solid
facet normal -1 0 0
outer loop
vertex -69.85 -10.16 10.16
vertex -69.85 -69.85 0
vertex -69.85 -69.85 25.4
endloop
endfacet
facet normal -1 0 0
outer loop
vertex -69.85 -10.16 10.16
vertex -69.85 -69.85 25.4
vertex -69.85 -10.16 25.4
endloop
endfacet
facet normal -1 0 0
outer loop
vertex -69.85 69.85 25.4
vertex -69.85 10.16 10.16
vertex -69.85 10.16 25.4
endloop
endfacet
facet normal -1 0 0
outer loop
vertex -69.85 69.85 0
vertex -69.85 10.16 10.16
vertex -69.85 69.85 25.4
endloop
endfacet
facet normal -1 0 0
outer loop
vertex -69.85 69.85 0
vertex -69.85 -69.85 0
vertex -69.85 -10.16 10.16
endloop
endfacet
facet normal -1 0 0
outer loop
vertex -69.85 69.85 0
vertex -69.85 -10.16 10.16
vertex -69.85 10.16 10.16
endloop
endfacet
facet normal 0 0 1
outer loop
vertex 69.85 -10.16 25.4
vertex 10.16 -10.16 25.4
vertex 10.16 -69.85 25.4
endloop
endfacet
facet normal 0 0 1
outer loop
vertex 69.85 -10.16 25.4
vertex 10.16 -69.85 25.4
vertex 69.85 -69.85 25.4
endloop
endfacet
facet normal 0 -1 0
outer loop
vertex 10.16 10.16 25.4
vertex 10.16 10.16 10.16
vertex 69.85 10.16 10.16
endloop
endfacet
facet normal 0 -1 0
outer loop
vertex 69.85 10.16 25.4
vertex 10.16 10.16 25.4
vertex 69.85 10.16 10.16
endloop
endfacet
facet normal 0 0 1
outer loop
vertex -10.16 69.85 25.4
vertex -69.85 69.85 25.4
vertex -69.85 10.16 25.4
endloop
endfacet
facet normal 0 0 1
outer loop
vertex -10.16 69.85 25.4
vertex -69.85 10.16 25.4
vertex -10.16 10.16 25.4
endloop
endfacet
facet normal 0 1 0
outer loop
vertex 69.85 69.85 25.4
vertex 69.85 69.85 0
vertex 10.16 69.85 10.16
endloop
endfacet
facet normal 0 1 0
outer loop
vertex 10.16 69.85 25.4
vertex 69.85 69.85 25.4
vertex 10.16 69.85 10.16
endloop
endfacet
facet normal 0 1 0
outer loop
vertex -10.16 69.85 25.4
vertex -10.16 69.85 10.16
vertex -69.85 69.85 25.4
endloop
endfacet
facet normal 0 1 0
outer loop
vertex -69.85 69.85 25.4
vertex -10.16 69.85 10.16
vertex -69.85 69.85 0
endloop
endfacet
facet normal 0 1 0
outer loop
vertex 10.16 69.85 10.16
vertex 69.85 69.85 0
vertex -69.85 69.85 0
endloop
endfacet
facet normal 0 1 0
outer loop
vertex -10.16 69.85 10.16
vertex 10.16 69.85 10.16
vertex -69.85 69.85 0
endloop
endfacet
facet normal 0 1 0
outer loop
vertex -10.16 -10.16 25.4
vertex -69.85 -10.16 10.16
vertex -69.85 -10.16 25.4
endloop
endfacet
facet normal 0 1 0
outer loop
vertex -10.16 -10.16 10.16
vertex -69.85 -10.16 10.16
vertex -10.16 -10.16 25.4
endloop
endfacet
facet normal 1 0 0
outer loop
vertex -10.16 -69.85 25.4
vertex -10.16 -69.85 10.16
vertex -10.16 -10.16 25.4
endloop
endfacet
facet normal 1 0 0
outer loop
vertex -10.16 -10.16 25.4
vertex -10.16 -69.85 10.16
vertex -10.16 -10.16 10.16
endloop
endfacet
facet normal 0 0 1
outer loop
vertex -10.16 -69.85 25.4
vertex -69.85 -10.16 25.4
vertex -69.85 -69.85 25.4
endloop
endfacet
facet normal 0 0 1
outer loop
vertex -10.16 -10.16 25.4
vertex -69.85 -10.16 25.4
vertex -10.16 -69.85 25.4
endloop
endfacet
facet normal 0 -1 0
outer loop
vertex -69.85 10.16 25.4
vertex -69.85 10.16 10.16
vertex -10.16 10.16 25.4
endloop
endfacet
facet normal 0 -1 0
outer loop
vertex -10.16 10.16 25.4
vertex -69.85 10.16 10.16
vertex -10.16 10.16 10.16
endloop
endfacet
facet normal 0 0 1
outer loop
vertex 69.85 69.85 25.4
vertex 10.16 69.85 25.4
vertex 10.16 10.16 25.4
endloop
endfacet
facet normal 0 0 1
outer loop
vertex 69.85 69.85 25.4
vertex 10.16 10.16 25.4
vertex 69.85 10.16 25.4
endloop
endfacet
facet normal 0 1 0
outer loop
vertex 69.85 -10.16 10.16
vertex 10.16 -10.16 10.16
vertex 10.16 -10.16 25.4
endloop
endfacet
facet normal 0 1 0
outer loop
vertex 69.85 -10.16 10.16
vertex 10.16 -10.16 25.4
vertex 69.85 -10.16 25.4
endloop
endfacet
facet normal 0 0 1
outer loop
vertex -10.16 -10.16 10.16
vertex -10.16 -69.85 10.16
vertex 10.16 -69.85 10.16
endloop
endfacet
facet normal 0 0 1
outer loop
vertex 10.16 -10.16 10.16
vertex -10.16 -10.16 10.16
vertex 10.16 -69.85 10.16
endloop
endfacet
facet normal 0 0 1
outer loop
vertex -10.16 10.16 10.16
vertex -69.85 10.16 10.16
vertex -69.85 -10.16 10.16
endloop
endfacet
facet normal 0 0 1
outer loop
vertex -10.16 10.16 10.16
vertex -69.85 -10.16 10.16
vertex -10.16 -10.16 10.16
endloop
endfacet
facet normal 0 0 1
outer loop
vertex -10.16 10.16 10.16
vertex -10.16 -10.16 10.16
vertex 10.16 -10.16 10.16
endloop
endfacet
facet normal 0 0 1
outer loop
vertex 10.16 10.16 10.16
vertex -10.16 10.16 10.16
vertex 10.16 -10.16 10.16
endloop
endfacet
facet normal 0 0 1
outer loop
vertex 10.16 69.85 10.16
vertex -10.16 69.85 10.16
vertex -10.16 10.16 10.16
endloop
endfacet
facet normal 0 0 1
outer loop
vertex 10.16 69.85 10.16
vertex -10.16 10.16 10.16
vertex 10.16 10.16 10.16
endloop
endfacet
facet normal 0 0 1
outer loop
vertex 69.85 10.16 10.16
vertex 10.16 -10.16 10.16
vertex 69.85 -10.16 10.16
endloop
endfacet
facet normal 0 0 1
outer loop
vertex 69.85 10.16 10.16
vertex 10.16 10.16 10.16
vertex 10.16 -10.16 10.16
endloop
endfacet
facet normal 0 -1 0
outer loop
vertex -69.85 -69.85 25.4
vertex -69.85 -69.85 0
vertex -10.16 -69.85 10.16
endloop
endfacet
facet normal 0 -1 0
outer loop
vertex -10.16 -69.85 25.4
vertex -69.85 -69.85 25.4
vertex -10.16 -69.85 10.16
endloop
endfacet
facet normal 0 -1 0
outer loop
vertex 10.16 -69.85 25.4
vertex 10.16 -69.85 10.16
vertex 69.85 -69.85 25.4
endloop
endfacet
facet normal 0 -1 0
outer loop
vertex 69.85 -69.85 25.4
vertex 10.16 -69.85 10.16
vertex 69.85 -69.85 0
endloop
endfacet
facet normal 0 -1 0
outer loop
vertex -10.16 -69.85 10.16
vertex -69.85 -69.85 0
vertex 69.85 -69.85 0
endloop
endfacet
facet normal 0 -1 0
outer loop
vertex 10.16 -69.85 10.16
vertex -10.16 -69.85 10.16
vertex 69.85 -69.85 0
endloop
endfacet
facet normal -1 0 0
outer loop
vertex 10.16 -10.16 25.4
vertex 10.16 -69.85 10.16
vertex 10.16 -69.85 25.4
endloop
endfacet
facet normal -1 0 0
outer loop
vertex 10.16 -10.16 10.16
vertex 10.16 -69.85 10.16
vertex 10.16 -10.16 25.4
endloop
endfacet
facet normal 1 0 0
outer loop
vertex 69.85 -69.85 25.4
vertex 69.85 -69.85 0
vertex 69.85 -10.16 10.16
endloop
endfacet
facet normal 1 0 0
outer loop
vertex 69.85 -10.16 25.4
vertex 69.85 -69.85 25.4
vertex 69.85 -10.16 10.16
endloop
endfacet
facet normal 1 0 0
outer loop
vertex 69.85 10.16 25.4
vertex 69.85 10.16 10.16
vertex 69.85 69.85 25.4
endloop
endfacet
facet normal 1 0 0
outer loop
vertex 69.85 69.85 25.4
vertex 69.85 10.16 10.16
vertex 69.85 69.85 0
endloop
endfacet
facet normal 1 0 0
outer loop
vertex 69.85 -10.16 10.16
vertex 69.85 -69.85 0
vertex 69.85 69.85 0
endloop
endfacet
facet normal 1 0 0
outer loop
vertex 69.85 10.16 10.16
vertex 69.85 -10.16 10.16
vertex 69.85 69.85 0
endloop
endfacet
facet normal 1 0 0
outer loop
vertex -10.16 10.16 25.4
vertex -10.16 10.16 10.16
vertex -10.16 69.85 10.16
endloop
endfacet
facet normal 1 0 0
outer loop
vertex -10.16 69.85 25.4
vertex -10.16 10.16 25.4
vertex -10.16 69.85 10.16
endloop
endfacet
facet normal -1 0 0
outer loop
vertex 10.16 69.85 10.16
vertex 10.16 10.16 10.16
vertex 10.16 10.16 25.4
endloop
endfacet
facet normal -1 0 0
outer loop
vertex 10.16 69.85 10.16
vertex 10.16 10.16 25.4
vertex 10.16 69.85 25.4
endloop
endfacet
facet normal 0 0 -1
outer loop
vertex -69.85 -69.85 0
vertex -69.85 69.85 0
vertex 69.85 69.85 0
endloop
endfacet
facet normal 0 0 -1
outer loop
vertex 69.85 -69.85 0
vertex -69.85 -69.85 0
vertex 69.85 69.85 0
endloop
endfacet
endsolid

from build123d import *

# Parameters (mm, degrees)
F0_W     = 59.69
F0_H     = 59.69
F1_DEPTH = 25.4
F3_DEPTH = 10.16


with BuildPart() as f1:
    # F0 (on Top) → F1 (new body)
    with BuildSketch(Plane.XY):
        with Locations((40.005, 40.005)):
            Rectangle(F0_W, F0_H)
    extrude(amount=F1_DEPTH)



with BuildPart() as f1b:
    # F0 (on Top) → F1, piece 2 (new body)
    with BuildSketch(Plane.XY):
        with Locations((40.005, -40.005)):
            Rectangle(F0_W, F0_H)
    extrude(amount=F1_DEPTH)


with BuildPart() as f1c:
    # F0 (on Top) → F1, piece 3 (new body)
    with BuildSketch(Plane.XY):
        with Locations((-40.005, -40.005)):
            Rectangle(F0_W, F0_H)
    extrude(amount=F1_DEPTH)


with BuildPart() as f1d:
    # F0 (on Top) → F1, piece 4 (new body)
    with BuildSketch(Plane.XY):
        with Locations((-40.005, 40.005)):
            Rectangle(F0_W, F0_H)
    extrude(amount=F1_DEPTH)


with BuildPart() as f1_1:
    add(f1.part)

    add(f1b.part)  # F3 merges F1b

    add(f1c.part)  # F3 merges F1c

    add(f1d.part)  # F3 merges F1d
    # F2 (on Top) → F3 (join)
    with BuildSketch(Plane.XY):
        Polygon((10.16, 69.85), (-10.16, 69.85), (-10.16, 10.16), (-69.85, 10.16), (-69.85, -10.16), (-10.16, -10.16), (-10.16, -69.85), (10.16, -69.85), (10.16, -10.16), (69.85, -10.16), (69.85, 10.16), (10.16, 10.16), align=None)
    extrude(amount=F3_DEPTH)


solid = f1_1.part
